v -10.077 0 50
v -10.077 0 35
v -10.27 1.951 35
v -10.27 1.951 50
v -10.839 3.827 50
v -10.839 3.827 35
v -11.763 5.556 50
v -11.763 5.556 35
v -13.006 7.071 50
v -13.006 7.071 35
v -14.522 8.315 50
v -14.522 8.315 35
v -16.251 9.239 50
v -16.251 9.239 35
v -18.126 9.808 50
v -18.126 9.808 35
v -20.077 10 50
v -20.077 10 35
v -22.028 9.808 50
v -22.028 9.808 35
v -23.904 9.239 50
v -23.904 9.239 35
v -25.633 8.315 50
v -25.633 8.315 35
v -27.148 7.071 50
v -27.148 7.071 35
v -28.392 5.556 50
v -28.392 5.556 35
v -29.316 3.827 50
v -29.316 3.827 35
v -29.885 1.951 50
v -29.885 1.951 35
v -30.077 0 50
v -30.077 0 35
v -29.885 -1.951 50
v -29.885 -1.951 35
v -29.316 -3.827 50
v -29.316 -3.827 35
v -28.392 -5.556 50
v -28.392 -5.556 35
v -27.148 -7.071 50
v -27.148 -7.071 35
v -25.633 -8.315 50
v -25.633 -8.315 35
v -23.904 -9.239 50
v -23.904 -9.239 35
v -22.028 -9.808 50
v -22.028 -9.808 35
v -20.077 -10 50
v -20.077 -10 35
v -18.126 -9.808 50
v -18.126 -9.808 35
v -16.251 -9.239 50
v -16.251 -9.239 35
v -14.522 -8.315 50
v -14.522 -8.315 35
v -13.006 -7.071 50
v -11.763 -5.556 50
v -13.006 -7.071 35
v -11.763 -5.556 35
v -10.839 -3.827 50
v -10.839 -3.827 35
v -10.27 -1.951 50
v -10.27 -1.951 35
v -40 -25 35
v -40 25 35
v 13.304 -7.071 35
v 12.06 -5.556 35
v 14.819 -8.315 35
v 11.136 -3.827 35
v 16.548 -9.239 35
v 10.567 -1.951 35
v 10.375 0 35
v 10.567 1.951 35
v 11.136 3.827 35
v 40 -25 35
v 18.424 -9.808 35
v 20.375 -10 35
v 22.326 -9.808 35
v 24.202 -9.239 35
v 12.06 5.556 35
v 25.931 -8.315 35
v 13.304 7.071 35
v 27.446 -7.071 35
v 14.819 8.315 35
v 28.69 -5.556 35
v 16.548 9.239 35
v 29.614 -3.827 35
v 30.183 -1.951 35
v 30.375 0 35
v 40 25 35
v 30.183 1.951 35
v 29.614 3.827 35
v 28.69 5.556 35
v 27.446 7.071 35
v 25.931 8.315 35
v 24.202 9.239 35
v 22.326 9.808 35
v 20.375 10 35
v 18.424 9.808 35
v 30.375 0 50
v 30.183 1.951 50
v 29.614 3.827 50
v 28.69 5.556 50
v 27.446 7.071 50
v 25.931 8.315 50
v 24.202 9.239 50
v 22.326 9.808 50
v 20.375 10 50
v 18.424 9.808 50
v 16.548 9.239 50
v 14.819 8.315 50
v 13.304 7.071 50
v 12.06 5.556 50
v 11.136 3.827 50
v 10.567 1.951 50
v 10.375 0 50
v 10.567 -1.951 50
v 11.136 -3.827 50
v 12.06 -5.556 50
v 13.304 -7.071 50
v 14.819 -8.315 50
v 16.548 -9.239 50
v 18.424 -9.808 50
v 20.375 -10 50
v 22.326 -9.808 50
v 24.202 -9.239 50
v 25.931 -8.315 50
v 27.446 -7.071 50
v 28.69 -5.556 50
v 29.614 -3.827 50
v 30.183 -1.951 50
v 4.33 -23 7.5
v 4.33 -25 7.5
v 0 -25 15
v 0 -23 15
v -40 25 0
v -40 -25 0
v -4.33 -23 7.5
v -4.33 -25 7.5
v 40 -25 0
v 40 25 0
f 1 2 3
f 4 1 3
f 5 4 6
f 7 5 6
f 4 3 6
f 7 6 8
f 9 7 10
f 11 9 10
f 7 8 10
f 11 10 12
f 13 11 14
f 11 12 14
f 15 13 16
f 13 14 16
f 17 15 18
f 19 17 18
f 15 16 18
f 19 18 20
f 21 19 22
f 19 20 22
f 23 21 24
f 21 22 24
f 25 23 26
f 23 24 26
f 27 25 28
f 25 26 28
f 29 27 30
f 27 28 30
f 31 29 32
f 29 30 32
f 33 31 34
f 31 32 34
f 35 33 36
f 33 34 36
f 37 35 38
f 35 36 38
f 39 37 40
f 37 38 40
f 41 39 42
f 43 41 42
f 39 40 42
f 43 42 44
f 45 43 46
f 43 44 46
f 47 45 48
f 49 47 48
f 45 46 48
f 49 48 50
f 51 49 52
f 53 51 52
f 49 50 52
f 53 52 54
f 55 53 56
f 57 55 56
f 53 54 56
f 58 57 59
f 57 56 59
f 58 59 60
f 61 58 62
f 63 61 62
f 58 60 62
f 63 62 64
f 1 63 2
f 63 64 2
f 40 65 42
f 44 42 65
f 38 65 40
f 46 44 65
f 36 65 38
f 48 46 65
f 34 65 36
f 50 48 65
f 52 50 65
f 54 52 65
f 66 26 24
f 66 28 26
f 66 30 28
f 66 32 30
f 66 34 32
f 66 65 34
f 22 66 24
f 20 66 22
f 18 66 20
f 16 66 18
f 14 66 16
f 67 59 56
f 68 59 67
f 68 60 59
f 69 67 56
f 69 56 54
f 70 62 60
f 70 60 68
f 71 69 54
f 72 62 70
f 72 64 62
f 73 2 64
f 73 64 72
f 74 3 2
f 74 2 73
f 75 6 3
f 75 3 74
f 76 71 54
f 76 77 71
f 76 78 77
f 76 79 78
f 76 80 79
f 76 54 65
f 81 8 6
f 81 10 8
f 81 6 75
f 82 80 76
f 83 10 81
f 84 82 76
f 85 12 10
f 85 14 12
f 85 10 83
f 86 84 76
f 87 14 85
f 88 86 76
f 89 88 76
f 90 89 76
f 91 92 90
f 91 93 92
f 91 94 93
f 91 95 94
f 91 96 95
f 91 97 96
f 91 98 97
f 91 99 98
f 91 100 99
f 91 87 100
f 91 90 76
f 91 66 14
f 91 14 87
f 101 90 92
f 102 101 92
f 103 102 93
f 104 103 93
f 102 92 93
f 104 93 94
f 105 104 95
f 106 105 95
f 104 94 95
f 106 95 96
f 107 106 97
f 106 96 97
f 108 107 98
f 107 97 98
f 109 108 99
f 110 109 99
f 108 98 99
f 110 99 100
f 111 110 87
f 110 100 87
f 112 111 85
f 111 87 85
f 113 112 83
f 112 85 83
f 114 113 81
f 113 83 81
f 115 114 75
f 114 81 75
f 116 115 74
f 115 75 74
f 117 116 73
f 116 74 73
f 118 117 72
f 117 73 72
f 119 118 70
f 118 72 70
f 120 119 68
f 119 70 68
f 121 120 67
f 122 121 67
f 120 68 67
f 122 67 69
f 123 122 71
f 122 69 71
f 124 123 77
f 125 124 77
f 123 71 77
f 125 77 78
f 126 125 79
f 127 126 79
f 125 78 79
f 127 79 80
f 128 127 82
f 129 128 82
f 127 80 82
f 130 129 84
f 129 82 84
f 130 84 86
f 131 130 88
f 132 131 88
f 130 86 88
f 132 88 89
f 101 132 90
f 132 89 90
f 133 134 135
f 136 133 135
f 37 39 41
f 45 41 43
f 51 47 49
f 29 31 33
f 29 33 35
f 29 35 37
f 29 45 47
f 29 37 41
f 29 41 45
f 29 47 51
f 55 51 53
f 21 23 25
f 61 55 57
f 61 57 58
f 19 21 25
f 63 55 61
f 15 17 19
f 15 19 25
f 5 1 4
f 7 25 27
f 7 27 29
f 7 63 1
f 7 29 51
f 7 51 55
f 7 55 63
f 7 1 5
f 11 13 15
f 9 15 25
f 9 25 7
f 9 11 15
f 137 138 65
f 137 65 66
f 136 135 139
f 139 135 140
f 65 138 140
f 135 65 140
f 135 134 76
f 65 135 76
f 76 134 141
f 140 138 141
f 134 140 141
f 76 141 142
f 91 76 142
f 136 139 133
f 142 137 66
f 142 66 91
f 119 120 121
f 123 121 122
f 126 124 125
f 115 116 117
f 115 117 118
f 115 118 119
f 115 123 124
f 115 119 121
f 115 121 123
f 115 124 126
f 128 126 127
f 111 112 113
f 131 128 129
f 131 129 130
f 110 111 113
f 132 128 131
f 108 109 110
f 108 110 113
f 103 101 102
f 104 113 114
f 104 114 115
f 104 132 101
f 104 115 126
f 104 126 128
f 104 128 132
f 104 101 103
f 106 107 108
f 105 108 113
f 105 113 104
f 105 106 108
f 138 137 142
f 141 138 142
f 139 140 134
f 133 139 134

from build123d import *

# Parameters (mm, degrees)
F0_W     = 80
F0_H     = 50
F1_DEPTH = 35
F3_DEPTH = 2
F4_R     = 10
F5_DEPTH = 15


with BuildPart() as f1:
    # F0 (on Top) → F1 (new body)
    with BuildSketch(Plane.XY):
        Rectangle(F0_W, F0_H)
    extrude(amount=F1_DEPTH)

    # F2 (on face) → F3 (cut)
    with BuildSketch(Plane.XZ.offset(25)):
        Polygon((0, 15), (-4.330127, 7.5), (4.330127, 7.5), align=None)
    extrude(amount=-F3_DEPTH, mode=Mode.SUBTRACT)

    # F4 (on face) → F5 (join)
    with BuildSketch(Plane.XY.offset(35)):
        with Locations((-20.077403, 0)):
            Circle(F4_R)
        with Locations((20.374997, 0)):
            Circle(F4_R)
    extrude(amount=F5_DEPTH)


solid = f1.part
